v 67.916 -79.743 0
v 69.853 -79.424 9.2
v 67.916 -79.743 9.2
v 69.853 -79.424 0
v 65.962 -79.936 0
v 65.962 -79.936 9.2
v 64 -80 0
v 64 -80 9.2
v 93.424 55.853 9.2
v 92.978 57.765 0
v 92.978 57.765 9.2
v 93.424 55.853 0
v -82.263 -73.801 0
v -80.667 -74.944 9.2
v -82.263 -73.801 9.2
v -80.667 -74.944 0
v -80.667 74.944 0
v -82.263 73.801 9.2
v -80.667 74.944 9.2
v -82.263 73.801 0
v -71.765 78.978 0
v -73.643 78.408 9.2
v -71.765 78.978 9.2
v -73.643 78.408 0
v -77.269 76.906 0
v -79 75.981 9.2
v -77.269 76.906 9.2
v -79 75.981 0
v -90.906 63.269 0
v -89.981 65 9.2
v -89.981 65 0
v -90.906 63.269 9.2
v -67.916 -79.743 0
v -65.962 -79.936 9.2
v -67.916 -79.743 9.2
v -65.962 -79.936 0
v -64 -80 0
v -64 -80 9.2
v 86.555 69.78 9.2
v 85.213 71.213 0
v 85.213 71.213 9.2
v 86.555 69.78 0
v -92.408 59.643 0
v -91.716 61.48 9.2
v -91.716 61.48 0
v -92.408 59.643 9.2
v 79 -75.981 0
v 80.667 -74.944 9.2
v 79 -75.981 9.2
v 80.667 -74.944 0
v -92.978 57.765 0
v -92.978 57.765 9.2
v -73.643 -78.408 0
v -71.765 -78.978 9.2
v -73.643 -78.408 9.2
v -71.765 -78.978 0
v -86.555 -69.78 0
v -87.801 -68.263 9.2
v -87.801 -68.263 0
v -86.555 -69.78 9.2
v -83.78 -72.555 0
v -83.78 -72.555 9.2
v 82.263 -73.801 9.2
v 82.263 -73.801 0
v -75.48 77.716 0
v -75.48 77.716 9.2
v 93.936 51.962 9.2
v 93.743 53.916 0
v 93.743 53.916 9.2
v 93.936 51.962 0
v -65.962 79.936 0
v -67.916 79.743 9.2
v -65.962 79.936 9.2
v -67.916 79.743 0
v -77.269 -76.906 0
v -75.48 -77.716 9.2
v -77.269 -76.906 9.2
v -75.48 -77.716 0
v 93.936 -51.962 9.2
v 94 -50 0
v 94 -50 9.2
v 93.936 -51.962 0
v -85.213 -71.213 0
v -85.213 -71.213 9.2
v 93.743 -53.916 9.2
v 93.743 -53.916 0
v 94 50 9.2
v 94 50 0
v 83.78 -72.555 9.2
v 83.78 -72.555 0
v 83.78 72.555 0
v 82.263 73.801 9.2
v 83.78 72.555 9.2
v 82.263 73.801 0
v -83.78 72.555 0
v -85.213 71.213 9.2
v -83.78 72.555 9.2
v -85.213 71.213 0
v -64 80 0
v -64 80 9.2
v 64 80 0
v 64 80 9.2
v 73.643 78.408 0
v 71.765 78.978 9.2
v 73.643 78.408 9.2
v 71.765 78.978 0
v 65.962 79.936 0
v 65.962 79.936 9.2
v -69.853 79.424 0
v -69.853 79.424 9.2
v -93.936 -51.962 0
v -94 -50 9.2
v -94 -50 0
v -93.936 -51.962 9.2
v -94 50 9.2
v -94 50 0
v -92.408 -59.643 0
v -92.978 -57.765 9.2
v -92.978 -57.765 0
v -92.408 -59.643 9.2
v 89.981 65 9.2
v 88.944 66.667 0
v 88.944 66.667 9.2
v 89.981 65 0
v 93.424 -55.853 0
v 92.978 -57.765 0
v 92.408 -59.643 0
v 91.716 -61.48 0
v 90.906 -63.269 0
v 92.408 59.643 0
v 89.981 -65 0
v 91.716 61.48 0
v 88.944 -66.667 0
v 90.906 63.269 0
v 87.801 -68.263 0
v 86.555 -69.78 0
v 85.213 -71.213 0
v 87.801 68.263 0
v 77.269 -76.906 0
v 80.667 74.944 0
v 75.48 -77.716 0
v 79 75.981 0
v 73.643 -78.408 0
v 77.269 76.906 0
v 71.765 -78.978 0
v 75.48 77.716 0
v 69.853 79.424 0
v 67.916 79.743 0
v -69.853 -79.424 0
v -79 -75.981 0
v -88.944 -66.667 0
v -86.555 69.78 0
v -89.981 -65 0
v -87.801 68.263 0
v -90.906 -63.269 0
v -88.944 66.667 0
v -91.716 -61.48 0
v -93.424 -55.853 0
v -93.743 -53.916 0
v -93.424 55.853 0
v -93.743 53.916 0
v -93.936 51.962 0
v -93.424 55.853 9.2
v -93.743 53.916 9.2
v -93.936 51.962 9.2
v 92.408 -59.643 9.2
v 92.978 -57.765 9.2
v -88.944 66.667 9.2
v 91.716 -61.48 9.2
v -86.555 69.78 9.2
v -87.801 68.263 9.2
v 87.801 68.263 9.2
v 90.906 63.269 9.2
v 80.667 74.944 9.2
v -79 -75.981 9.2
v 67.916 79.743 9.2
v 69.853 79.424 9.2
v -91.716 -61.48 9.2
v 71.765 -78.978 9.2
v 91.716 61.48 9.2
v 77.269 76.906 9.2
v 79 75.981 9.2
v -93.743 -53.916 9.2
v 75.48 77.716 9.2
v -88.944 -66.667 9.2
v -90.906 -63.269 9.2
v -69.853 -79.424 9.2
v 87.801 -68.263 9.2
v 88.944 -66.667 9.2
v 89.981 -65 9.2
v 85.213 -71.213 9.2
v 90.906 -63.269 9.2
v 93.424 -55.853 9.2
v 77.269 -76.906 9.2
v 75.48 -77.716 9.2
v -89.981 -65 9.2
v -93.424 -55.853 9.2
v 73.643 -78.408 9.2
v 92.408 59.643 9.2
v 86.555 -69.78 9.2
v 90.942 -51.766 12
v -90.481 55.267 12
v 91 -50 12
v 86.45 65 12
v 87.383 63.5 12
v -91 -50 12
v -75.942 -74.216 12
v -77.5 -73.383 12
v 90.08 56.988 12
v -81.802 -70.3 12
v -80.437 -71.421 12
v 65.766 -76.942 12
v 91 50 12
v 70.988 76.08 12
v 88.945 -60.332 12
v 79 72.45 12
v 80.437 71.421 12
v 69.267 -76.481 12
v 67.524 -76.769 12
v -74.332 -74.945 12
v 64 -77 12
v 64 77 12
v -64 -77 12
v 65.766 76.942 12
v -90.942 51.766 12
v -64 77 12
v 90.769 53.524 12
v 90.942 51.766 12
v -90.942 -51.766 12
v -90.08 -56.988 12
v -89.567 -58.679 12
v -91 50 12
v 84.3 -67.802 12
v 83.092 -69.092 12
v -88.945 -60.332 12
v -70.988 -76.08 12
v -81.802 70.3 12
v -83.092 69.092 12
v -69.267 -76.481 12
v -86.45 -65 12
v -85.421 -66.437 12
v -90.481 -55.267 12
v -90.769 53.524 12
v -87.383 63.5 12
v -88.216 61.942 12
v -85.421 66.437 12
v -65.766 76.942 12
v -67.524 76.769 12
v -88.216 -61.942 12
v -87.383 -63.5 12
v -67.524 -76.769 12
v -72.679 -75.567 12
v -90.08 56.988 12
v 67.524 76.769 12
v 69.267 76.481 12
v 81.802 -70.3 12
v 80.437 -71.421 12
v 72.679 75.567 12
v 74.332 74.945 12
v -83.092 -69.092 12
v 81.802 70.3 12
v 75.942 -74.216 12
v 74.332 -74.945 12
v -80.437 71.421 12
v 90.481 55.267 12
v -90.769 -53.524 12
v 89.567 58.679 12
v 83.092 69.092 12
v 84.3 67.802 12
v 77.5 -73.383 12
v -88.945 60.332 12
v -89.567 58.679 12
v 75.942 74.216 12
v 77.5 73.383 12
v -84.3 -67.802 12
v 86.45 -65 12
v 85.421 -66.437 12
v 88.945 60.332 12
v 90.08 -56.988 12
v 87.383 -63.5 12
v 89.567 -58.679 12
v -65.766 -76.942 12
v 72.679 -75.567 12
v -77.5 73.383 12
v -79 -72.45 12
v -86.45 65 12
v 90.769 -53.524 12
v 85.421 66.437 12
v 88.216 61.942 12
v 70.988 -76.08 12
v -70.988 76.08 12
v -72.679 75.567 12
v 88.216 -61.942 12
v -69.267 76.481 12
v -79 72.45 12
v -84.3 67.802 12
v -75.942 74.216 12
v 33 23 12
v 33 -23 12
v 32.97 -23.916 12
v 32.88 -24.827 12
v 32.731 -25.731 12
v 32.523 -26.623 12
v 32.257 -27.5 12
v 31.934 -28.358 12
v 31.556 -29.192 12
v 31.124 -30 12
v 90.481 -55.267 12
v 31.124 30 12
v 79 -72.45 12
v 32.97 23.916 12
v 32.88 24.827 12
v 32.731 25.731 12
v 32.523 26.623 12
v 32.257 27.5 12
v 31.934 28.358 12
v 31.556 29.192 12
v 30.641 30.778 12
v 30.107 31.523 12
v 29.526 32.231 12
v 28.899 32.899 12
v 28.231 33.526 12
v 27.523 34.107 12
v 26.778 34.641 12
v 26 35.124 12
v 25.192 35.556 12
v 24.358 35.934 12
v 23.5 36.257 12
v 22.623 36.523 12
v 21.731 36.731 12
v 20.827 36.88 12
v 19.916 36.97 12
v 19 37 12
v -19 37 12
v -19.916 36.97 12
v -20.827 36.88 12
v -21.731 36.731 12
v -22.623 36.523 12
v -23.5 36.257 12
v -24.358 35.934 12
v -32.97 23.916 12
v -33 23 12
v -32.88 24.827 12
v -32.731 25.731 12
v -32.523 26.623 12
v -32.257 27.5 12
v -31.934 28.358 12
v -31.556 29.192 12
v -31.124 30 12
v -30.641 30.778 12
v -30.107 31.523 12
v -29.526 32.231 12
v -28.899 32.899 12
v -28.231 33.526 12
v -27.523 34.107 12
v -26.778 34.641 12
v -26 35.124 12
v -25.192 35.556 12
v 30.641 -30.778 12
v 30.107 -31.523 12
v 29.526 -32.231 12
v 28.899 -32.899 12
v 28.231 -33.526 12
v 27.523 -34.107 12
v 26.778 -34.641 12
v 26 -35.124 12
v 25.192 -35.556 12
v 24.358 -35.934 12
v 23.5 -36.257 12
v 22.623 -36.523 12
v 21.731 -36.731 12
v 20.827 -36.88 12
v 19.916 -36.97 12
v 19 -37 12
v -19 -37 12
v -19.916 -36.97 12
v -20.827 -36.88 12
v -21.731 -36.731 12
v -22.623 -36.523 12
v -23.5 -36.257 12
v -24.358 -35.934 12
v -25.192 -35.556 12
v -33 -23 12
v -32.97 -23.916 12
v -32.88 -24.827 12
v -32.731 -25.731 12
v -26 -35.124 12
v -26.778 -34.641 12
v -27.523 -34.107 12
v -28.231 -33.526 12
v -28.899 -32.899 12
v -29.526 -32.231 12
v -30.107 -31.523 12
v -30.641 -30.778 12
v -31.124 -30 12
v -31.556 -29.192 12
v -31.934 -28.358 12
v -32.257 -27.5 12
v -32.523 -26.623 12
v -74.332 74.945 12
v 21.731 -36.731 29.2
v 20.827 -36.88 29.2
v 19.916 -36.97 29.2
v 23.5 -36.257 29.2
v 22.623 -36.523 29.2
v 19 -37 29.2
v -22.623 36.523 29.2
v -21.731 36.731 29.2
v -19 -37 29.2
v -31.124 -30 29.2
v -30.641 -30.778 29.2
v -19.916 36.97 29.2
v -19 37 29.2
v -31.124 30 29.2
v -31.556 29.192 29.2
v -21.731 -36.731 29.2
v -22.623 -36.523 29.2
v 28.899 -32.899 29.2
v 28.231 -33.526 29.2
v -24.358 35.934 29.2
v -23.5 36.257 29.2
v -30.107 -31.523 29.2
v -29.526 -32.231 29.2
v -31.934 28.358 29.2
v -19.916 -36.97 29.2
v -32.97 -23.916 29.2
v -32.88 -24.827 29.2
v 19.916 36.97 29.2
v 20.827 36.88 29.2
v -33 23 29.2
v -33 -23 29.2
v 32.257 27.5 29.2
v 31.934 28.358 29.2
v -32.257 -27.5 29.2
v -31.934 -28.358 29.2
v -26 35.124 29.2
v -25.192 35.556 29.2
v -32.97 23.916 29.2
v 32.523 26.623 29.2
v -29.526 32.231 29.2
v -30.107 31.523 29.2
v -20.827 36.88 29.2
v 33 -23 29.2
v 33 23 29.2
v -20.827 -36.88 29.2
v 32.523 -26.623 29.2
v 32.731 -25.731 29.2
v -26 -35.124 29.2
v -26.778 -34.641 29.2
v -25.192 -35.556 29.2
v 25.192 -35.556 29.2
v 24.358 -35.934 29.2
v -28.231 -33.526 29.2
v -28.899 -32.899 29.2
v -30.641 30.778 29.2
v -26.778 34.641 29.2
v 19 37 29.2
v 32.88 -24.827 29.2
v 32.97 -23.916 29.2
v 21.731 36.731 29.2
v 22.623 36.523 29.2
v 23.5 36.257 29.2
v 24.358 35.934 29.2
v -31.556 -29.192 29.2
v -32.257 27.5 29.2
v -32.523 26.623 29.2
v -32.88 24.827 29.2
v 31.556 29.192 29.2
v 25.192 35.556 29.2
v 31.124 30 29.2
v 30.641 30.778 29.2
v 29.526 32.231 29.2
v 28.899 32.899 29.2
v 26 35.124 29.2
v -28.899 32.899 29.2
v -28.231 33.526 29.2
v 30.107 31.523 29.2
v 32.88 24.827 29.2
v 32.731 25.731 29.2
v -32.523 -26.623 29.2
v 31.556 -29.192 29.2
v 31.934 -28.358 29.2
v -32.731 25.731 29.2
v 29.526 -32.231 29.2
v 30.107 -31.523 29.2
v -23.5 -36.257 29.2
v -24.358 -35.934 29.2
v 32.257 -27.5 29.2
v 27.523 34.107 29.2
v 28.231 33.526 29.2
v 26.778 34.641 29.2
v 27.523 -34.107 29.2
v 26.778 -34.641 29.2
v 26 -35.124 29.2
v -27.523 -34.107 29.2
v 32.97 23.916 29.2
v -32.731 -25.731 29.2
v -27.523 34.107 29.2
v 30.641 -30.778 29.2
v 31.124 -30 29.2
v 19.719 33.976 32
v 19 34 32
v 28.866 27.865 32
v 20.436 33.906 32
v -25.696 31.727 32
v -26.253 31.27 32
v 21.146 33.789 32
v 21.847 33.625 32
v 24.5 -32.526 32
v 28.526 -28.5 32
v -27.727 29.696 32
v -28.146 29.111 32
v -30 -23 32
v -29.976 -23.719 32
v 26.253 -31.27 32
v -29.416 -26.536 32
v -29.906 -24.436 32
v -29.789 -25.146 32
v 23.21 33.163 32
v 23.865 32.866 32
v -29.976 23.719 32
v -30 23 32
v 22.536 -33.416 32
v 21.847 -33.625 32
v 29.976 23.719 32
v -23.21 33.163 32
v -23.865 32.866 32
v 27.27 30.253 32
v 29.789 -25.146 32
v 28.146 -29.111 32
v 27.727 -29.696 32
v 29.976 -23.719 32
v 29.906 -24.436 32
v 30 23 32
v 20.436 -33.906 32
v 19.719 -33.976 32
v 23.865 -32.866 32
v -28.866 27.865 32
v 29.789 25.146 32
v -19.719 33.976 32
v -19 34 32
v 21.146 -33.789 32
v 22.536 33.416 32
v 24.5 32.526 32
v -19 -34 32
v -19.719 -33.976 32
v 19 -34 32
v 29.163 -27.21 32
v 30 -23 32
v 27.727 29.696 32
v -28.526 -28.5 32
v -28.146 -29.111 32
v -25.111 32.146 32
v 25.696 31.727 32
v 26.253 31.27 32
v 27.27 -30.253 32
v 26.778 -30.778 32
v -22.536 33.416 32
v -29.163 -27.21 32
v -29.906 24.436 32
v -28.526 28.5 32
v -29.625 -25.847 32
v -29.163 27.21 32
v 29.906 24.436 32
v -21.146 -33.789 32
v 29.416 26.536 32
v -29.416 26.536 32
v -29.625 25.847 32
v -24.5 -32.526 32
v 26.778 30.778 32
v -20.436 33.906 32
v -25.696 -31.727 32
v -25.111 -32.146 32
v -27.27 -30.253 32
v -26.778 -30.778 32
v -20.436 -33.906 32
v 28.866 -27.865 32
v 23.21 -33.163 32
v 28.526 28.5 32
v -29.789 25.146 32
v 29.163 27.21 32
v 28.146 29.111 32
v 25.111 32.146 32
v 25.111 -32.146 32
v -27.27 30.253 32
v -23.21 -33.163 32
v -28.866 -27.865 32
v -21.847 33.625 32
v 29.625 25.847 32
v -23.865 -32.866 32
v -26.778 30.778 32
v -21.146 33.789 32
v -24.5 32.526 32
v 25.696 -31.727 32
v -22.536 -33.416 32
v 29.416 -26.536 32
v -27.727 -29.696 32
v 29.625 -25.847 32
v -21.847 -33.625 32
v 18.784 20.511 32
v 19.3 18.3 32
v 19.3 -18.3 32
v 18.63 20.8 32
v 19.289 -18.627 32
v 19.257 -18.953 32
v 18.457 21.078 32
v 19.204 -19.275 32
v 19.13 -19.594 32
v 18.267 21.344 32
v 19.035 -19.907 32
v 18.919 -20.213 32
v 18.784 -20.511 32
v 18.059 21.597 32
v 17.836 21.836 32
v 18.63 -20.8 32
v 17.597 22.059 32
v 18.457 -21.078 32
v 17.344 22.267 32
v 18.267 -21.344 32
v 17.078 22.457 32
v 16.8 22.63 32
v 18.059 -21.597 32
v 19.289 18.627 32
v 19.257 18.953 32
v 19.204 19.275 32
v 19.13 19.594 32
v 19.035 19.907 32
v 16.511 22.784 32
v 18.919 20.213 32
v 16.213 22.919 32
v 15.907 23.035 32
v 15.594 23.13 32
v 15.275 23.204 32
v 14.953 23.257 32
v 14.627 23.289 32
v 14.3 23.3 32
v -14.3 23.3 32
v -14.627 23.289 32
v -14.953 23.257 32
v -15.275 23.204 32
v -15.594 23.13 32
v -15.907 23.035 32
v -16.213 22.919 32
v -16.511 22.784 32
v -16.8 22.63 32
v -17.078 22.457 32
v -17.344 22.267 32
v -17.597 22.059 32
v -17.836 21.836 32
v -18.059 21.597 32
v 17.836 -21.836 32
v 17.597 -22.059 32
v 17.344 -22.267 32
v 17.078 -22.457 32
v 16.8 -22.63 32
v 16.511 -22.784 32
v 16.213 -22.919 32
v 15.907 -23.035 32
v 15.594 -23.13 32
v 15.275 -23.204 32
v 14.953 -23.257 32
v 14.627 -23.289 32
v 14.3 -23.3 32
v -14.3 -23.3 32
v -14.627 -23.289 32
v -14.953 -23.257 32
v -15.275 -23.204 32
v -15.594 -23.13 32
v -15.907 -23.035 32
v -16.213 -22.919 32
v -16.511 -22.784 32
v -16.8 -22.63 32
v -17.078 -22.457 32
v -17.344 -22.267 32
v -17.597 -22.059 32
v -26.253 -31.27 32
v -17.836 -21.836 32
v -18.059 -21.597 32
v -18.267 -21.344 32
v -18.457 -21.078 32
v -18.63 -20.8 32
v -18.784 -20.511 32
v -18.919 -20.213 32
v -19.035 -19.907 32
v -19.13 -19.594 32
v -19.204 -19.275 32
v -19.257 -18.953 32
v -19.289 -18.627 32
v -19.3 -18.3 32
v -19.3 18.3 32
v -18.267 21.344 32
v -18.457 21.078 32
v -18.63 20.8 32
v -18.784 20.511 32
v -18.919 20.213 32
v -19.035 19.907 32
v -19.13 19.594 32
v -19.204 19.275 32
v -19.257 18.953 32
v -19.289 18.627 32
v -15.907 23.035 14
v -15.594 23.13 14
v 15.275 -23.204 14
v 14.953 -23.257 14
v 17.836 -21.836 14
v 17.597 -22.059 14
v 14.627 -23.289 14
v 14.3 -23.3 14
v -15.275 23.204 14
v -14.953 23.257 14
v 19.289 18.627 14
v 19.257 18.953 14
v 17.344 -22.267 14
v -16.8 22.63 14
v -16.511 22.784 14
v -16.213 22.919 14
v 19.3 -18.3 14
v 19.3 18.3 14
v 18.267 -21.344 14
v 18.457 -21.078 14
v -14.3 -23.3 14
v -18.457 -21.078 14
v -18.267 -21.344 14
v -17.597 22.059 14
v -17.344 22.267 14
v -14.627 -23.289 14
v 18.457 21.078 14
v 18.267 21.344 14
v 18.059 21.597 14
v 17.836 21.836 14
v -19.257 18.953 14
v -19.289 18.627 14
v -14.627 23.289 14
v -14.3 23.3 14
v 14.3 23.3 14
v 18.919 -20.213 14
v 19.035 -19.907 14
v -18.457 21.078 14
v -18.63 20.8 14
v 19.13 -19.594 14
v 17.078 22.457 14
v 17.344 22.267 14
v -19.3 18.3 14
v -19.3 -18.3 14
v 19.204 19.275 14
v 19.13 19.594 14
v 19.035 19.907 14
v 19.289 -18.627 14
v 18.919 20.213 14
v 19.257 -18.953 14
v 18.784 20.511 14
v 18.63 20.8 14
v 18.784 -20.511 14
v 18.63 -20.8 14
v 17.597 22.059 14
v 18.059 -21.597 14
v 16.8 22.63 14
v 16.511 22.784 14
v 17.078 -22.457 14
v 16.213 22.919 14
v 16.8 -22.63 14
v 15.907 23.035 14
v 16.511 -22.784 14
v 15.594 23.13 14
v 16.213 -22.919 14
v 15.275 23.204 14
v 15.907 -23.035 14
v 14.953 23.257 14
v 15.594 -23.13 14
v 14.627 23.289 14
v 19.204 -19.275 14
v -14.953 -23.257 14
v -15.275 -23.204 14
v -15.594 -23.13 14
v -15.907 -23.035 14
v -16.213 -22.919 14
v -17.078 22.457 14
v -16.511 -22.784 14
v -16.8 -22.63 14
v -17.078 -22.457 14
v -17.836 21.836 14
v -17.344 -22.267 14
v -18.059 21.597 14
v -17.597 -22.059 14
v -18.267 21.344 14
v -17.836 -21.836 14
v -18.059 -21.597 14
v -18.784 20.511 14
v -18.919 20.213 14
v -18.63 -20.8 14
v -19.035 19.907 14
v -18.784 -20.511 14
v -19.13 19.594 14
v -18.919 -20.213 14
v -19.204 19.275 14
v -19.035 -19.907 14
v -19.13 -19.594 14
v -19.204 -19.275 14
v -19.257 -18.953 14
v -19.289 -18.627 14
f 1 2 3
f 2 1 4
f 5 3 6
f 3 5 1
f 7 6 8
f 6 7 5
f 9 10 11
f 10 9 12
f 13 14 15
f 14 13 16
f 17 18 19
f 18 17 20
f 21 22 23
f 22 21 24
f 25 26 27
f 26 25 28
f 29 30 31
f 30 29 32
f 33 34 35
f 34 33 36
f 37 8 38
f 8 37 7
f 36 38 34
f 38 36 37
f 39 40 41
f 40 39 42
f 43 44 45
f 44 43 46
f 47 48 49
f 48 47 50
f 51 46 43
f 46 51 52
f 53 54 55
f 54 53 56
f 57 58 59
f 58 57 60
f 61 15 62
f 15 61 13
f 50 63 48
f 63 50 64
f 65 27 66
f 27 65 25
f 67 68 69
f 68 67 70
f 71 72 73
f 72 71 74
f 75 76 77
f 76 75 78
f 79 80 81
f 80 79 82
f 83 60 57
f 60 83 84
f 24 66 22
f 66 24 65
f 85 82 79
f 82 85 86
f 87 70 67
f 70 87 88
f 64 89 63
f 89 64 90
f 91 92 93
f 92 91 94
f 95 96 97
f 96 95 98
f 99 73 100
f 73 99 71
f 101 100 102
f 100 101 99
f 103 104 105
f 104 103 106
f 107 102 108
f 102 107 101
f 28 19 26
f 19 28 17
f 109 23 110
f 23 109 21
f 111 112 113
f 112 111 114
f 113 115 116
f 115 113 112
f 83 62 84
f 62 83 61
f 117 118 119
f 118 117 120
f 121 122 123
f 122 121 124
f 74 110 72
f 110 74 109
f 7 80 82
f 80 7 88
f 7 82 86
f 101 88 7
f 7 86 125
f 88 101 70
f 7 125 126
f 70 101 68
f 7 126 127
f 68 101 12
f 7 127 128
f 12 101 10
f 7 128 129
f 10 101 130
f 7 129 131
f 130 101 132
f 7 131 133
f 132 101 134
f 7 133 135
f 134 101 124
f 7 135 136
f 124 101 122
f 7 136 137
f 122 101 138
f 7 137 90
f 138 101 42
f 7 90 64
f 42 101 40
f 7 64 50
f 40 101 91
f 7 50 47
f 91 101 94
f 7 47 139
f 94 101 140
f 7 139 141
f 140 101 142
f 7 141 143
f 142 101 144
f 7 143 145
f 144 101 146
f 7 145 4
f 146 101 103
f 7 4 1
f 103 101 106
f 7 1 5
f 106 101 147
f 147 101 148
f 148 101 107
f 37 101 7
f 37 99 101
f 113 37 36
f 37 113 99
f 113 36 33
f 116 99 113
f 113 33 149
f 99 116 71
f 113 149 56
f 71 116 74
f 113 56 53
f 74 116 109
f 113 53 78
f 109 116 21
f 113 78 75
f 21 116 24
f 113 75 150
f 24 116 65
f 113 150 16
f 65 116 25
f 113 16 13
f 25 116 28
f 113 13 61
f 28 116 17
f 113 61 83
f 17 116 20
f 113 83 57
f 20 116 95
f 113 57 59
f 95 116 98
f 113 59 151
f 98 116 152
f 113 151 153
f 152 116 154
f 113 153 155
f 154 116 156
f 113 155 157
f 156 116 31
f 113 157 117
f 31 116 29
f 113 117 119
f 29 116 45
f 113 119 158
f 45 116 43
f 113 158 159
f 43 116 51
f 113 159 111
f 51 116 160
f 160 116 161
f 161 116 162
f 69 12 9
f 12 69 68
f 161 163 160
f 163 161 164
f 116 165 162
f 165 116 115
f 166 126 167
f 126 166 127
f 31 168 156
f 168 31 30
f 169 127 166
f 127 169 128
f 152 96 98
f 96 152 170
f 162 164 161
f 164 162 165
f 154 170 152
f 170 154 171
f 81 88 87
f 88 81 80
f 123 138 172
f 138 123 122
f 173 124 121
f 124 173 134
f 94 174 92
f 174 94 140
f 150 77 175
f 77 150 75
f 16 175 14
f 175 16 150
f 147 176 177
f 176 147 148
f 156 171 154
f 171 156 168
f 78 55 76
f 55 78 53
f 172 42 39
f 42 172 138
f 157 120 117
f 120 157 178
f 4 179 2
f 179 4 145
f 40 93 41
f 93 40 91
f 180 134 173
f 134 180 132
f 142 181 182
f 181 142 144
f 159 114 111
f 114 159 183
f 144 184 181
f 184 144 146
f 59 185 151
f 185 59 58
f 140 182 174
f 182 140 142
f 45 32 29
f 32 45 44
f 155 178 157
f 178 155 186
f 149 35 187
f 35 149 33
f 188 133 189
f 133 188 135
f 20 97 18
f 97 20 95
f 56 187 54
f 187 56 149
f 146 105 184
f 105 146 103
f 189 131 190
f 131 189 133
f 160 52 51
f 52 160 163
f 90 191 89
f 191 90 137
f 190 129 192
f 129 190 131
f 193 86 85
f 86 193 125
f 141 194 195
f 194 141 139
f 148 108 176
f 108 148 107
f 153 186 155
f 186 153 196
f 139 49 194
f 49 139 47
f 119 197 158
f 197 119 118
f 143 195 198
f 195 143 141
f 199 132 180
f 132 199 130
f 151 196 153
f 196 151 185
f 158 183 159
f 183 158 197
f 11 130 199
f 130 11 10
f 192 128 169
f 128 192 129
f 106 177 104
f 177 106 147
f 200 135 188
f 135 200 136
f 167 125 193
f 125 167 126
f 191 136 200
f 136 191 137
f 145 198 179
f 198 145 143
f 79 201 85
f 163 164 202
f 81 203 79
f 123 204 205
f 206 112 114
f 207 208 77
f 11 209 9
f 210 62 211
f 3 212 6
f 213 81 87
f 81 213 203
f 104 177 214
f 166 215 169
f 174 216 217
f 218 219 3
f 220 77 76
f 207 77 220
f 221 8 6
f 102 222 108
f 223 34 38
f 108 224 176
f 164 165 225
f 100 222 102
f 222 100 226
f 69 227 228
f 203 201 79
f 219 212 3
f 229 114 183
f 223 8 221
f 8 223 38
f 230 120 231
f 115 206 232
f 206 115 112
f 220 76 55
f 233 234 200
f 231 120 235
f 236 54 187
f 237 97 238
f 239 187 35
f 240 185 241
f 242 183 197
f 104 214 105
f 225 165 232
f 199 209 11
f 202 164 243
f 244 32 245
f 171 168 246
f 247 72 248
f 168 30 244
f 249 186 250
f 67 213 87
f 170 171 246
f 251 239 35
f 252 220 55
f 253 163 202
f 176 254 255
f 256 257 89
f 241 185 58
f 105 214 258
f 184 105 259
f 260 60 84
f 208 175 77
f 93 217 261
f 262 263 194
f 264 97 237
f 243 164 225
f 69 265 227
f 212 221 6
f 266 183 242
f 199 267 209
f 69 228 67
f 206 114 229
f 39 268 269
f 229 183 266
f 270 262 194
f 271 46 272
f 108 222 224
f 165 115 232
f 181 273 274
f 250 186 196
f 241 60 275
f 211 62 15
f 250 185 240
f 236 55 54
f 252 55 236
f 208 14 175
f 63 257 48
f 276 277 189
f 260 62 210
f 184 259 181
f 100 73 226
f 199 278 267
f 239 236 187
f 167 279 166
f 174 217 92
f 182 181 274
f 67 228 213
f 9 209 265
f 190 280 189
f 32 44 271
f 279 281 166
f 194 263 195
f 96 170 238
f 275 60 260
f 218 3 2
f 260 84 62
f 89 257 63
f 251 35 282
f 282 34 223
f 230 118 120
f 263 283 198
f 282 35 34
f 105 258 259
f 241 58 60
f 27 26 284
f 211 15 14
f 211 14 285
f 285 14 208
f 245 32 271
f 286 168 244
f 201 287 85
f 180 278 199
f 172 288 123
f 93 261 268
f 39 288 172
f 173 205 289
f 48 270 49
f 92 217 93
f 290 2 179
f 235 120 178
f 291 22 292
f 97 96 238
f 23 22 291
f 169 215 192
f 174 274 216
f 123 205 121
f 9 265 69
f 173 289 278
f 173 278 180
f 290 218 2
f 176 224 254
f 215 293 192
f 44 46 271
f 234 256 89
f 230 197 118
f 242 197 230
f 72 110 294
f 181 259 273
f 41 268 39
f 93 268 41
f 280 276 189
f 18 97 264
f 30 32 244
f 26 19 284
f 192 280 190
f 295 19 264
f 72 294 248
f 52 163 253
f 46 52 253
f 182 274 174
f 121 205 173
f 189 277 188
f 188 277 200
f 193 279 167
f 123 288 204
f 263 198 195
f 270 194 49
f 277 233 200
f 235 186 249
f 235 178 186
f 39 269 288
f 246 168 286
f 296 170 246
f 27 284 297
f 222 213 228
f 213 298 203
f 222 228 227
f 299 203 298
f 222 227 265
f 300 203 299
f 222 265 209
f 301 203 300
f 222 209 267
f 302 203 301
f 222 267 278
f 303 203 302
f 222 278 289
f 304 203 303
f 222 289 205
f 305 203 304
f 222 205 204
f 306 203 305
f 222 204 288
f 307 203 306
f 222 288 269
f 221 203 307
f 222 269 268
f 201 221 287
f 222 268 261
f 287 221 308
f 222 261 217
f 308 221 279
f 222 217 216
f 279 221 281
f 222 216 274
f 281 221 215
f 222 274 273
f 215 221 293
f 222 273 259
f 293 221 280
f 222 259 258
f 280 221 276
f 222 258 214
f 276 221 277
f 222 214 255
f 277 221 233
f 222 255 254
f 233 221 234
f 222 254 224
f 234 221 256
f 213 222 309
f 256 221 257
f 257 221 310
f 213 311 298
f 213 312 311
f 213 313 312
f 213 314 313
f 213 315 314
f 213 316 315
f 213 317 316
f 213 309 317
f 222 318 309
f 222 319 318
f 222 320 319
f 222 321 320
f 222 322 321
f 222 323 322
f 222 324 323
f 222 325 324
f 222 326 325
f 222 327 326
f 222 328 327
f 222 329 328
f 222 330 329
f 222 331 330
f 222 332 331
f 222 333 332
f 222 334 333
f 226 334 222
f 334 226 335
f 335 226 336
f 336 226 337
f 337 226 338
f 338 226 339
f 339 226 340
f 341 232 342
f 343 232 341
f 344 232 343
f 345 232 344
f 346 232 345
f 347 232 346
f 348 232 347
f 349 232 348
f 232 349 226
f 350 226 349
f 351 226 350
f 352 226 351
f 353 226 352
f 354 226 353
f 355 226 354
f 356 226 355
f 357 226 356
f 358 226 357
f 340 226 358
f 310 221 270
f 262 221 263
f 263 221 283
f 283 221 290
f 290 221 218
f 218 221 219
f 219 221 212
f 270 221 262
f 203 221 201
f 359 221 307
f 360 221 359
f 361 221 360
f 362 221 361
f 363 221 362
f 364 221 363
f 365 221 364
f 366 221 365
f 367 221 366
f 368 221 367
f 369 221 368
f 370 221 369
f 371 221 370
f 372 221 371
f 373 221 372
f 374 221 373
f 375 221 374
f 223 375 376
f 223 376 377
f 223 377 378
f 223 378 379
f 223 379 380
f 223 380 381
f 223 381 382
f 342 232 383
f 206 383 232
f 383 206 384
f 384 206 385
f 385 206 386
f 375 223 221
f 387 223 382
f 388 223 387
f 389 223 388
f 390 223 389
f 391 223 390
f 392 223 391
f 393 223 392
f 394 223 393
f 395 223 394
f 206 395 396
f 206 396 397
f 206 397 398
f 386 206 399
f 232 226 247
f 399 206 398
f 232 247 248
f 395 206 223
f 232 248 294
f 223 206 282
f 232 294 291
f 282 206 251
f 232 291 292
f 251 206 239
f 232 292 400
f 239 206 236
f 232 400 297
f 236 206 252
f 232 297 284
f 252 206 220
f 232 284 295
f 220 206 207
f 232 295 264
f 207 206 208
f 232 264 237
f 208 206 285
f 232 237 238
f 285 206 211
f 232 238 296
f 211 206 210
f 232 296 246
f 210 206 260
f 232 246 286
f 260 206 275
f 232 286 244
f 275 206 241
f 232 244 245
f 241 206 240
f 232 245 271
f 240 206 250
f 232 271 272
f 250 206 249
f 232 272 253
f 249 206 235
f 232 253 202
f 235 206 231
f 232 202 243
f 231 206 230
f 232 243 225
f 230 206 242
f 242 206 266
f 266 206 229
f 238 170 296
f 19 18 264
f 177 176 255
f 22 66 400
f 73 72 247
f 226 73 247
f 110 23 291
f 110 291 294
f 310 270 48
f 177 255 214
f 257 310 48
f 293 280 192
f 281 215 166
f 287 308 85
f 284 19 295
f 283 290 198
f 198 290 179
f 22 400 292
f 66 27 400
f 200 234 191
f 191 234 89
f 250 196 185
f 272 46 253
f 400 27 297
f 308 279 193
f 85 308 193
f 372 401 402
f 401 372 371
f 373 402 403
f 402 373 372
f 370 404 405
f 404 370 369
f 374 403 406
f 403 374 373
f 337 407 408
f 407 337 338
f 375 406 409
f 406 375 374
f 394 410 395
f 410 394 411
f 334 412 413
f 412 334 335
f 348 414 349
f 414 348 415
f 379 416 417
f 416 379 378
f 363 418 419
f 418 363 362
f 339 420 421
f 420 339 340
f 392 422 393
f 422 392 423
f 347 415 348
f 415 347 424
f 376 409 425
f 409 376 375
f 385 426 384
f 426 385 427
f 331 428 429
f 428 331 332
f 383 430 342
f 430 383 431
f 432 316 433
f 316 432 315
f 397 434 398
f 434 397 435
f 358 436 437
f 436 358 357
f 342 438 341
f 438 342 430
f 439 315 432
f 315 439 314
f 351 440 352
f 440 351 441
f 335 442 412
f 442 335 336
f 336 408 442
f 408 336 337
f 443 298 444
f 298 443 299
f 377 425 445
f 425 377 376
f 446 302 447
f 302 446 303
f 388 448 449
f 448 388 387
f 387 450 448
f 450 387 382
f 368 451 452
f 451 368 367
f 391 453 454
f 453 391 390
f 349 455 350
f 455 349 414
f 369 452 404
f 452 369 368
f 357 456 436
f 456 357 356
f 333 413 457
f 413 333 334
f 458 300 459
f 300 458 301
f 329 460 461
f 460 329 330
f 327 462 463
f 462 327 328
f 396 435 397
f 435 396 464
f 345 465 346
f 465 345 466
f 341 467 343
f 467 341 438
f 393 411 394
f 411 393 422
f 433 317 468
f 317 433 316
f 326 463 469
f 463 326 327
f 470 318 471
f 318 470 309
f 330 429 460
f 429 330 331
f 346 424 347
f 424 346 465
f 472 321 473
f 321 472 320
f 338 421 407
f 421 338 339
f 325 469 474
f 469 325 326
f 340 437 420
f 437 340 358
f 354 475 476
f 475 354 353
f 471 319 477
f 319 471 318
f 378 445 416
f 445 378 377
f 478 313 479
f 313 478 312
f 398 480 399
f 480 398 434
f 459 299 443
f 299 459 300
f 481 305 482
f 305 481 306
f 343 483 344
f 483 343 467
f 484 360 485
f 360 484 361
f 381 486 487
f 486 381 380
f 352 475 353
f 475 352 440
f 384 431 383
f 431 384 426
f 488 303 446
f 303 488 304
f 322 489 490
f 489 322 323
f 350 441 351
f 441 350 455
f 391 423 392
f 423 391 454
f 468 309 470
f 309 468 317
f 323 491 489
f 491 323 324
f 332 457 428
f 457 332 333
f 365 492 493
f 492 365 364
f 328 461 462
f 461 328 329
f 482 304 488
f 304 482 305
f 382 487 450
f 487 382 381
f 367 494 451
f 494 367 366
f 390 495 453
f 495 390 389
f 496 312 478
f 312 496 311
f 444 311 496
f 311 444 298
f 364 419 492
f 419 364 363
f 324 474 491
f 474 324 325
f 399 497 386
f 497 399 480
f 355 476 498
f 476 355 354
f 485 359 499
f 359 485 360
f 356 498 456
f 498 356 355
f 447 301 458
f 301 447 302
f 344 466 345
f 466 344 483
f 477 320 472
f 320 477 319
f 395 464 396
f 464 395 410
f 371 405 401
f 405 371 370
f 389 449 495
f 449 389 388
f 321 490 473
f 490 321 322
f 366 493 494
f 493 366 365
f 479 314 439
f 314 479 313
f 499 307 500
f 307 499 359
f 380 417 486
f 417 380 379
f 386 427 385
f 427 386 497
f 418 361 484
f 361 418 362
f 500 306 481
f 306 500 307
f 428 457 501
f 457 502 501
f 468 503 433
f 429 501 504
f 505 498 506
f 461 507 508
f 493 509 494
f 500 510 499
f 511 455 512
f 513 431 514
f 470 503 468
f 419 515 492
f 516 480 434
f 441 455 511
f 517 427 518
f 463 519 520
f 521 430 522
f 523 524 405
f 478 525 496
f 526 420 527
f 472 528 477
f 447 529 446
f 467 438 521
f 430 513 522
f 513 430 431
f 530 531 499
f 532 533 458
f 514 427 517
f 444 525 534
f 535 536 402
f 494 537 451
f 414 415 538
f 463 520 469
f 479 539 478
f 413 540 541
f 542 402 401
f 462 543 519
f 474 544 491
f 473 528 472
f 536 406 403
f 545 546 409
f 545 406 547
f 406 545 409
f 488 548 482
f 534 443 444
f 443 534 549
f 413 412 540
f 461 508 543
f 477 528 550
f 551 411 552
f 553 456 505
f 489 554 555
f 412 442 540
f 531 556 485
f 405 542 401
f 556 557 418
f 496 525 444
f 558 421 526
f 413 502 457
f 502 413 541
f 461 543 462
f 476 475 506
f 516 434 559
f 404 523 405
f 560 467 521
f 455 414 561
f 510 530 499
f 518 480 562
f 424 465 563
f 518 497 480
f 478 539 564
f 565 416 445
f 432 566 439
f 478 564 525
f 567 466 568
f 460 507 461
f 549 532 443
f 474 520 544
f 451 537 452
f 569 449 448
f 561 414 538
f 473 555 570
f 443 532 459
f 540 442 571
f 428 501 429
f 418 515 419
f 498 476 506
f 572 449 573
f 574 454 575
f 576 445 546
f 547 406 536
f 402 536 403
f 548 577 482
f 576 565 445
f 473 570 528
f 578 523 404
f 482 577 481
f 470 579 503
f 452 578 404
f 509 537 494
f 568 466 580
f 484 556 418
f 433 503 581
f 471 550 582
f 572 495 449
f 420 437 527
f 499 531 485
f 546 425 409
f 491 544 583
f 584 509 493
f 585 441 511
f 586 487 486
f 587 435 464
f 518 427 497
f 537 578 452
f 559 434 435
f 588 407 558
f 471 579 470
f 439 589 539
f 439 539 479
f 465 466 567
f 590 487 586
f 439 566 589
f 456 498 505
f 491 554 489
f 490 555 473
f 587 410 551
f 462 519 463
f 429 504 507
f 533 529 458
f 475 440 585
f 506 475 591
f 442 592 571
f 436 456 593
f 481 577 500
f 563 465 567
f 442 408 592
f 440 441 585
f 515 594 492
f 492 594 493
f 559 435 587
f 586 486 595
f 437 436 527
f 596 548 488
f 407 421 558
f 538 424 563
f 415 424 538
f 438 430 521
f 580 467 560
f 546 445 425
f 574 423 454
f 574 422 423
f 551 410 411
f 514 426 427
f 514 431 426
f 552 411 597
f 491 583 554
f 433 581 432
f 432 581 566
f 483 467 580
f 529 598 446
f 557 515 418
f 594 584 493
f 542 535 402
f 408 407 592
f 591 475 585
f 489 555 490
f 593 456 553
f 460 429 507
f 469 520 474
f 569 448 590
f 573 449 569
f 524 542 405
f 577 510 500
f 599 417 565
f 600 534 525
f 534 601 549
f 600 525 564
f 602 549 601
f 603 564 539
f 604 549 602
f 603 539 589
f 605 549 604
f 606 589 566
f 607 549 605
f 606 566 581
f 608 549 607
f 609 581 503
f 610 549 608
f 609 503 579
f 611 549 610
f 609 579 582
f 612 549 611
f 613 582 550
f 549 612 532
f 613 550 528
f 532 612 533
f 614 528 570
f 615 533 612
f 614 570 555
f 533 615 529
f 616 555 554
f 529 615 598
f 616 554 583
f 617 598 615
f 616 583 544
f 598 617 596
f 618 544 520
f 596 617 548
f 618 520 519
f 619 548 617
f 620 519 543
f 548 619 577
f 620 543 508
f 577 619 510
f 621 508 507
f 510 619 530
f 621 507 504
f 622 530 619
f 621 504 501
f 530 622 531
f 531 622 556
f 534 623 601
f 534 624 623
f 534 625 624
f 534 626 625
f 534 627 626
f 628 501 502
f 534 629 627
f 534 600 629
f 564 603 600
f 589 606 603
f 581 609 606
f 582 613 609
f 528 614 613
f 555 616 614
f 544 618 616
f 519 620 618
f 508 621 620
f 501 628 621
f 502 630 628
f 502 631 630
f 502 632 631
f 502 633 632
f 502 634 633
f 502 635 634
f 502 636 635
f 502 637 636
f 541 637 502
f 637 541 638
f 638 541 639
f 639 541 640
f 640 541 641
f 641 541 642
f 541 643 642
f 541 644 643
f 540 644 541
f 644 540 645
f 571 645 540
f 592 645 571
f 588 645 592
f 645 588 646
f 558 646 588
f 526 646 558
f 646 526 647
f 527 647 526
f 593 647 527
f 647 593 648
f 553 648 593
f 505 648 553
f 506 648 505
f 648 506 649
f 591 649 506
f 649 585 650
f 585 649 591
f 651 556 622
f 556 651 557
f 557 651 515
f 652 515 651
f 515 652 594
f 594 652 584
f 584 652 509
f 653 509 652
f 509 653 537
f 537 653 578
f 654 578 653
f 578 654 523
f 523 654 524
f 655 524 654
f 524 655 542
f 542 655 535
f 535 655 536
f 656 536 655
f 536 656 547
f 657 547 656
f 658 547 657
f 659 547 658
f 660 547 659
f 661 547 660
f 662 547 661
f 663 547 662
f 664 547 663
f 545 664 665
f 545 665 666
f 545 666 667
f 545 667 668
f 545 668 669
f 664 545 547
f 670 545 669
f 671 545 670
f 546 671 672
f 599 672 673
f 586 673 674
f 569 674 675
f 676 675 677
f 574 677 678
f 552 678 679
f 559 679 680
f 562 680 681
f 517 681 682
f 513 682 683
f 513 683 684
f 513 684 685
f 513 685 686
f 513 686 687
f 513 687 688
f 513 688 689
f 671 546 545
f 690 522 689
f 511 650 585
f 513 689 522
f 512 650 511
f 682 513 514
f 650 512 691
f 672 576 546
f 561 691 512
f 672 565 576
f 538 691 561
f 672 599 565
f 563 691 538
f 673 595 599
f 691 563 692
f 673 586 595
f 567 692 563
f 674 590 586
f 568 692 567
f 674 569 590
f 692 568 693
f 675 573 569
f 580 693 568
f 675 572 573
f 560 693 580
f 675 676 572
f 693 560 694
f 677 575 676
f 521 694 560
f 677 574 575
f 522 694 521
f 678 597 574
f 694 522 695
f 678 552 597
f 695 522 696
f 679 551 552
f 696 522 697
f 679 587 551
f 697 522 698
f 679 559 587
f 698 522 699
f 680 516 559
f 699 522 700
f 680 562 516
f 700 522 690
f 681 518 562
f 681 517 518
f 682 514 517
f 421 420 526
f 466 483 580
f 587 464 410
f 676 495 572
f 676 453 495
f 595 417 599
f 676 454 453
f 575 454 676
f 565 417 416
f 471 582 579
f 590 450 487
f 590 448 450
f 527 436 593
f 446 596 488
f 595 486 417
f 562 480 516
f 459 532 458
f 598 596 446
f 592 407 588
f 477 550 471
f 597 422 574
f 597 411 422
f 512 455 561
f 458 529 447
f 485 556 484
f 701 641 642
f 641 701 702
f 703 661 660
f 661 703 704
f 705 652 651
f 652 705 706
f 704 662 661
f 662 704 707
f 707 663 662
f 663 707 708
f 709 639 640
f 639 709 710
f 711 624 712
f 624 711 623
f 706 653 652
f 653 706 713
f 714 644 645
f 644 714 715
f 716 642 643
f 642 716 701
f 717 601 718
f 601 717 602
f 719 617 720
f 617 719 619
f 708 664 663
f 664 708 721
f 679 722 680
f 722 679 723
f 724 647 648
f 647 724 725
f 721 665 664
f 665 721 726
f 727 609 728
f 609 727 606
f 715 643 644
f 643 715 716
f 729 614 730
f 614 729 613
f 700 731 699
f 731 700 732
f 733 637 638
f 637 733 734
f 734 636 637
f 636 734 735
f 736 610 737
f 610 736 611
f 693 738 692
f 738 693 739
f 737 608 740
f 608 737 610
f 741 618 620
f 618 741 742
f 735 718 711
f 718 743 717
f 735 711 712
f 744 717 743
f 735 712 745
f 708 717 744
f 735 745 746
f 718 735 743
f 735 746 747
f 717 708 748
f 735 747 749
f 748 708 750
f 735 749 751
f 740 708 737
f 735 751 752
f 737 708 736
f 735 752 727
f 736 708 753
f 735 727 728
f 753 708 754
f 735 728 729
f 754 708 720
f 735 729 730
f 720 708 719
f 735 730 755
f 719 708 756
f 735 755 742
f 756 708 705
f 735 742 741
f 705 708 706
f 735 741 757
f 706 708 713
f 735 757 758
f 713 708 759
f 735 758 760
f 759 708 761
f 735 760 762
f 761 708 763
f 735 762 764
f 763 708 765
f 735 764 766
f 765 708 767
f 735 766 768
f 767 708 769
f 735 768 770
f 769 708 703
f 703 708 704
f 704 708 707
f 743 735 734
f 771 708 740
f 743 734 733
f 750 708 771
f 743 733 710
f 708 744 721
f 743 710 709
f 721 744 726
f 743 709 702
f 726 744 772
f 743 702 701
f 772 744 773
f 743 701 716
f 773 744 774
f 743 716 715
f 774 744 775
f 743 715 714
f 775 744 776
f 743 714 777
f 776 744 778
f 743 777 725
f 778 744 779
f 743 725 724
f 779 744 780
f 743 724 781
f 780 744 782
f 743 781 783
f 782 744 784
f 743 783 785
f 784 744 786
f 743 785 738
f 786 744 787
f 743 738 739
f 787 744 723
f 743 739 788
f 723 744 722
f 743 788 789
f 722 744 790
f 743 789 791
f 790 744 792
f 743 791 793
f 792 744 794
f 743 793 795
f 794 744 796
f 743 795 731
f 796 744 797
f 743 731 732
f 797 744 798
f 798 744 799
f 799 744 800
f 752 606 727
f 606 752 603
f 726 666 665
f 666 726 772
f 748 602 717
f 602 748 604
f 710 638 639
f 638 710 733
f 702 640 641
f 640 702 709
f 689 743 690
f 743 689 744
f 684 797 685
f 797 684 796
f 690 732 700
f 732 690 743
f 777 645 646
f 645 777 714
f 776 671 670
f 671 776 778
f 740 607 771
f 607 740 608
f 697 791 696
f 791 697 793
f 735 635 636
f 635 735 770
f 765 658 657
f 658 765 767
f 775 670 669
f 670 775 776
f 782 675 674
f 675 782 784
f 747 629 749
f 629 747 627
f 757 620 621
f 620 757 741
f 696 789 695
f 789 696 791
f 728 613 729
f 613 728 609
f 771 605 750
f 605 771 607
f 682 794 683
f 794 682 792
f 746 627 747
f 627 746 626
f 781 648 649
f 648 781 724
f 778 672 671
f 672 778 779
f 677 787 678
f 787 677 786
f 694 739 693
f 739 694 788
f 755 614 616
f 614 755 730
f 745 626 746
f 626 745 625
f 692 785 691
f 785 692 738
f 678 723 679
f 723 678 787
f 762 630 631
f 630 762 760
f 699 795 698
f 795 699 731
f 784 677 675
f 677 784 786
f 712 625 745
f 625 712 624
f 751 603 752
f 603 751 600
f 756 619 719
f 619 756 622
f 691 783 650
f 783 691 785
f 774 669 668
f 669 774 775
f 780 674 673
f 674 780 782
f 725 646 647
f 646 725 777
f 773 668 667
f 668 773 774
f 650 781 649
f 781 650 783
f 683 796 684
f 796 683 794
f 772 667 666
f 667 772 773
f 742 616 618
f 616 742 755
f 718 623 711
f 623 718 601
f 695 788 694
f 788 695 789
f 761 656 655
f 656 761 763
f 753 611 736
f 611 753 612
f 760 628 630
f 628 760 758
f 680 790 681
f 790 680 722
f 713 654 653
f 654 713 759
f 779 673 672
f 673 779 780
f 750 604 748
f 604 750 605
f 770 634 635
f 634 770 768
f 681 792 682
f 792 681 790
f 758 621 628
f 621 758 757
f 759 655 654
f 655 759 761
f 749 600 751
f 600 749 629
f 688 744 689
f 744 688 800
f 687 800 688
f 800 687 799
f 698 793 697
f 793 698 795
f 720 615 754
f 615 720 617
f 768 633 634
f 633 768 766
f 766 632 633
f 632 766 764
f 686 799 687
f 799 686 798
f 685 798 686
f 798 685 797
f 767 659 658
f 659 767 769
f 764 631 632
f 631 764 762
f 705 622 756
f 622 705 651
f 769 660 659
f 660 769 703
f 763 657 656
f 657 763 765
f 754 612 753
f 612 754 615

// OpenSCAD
// Headphone stand in three printable parts: base, post, hanger.
// No glue, no screws. Rectangular (non-round) blade tenons prevent spinning.
// All dimensions in mm. Print orientation is the exported orientation (+Z up).
//
// Assembly heights (assembly coordinates, desk at z=0):
//   base plate/boss top        0 .. 32
//   post                       14.5 .. 250  (17.5 mm of it inside the base socket)
//   hanger tenon               228.5 .. 250 (21.5 mm inside the post socket)
//   hanger saddle top centre   270
// Socket clearances: 0.3 mm per side (socket is tenon + 0.6 in each dimension),
// tenon tips stop 0.5 mm above socket floors; shoulders/faces give the depth stop
// for the hanger, and the post bottoms in its socket.

part = "base"; // [base, post, hanger, assembly]
cadverify_only = "";

$fn = 96;

/* [Base] */
base_w = 188;          // desk footprint, X
base_d = 160;          // desk footprint, Y
base_plate_top = 9;    // straight plate wall up to here, then 45 deg chamfer to 12
base_top_plate = 12;
boss_w = 66;
boss_d = 74;
boss_straight_top = 29; // then 45 deg chamfer to boss_top
boss_top = 32;
base_socket_w = 38.6;  // post 38 + 0.6
base_socket_d = 46.6;  // post 46 + 0.6
base_socket_floor = 14;

/* [Post] */
post_w = 38;
post_d = 46;
post_len = 235.5;      // tip (local z=0) to top (assembly 250)
post_top_socket_w = 24.6; // hanger tenon 24 + 0.6
post_top_socket_d = 34.6; // hanger tenon 34 + 0.6
post_top_socket_floor_local = 213.5; // assembly 228

/* [Hanger, modelled in print coordinates] */
// Print coordinates: X = saddle length, Y = height above tenon tip,
// Z = saddle width direction (part lies on its Z=0 side face on the bed).
hang_len_half = 69;    // overall saddle half length incl. rounded end point
hang_width = 34;       // >= 30 mm headband support width
hang_top_rel = 41.5;   // tenon tip to saddle crown; assembly 228.5 + 41.5 = 270
hang_arc_r = 170;      // crown radius of the headband contact surface
hang_plate_t = 10;     // saddle plate thickness (vertical, in profile)
hang_tenon_half_w = 12;  // tenon is 24 (X) x 34 (width)
hang_shoulder_rel = 21.5; // assembly 250, post top
hang_neck_half_w = 17;

function hang_top_z(x) = hang_top_rel - (hang_arc_r - sqrt(hang_arc_r*hang_arc_r - x*x));
function hang_bot_z(x) = hang_top_z(x) - hang_plate_t;

module rounded_rect(w, d, r) {
    offset(r = r) square([w - 2*r, d - 2*r], center = true);
}

module instance(name, part_name, unit = 1) {
    echo(cadverify_instance = [name, part_name, unit]);
    if (cadverify_only == "" || cadverify_only == name) children();
}

/* ---------- BASE (print = assembly orientation) ---------- */
module base_part() {
    difference() {
        // Outer corners of the plate and boss are rounded in plan view (corner
        // radius >= 6 mm) and the top rims have 45 deg x 3 mm chamfers, so
        // nothing sticks out beyond the bounding box or the support plane.
        union() {
            // desk plate with 45 deg top edge chamfer
            linear_extrude(base_plate_top) rounded_rect(base_w, base_d, 30);
            hull() {
                translate([0, 0, base_plate_top]) linear_extrude(0.2)
                    rounded_rect(base_w, base_d, 30);
                translate([0, 0, base_top_plate - 0.2]) linear_extrude(0.2)
                    rounded_rect(base_w - 6, base_d - 6, 27);
            }
            // raised boss / collar around the post socket, 45 deg top chamfer
            translate([0, 0, base_top_plate])
                linear_extrude(boss_straight_top - base_top_plate)
                    rounded_rect(boss_w, boss_d, 14);
            hull() {
                translate([0, 0, boss_straight_top]) linear_extrude(0.2)
                    rounded_rect(boss_w, boss_d, 14);
                translate([0, 0, boss_top - 0.2]) linear_extrude(0.2)
                    rounded_rect(boss_w - 6, boss_d - 6, 11);
            }
        }
        // blind rectangular socket for the post (stops post spinning)
        translate([0, 0, base_socket_floor])
            linear_extrude(boss_top - base_socket_floor + 2)
                rounded_rect(base_socket_w, base_socket_d, 5);
    }
}

/* ---------- POST (printed upright, local z=0 is tenon tip) ---------- */
module post_part() {
    difference() {
        // Solid rectangular column, corners rounded 8 mm in plan view.
        linear_extrude(post_len) rounded_rect(post_w, post_d, 8);
        // Blind rectangular socket in the top for the hanger blade tenon:
        // tenon + 0.6 mm per side (0.3 mm clearance); the non-round rectangle
        // is what stops the hanger spinning on the post.
        translate([0, 0, post_top_socket_floor_local])
            linear_extrude(post_len - post_top_socket_floor_local + 2)
                rounded_rect(post_top_socket_w, post_top_socket_d, 5);
    }
}

/* ---------- HANGER (printed on its side) ---------- */
module hanger_part() {
    top_pts    = [for (x = [56 : -8 : -56]) [x, hang_top_z(x)]];
    bot_r_pts  = [for (x = [40 : 8 : 64]) [40 + 8*floor((x - 24)/8), 0]];
    bot_l_pts  = [for (x = [-64 : 8 : -40]) [0, 0]];
    mid64 = (hang_top_z(64) + hang_bot_z(64)) / 2;
    // Saddle/neck profile above the shoulder plane (print y = hang_shoulder_rel).
    profile = concat(
        [[-hang_neck_half_w, hang_shoulder_rel], [hang_neck_half_w, hang_shoulder_rel],
         [30, hang_bot_z(30)]],
        bot_r_pts,
        [[hang_len_half - 0.5, mid64], [64, hang_top_z(64)]],
        top_pts,
        [[-64, hang_top_z(64)], [-(hang_len_half - 0.5), mid64], [-64, hang_bot_z(64)]],
        bot_l_pts,
        [[-30, hang_bot_z(30)]]
    );
    difference() {
        union() {
            linear_extrude(hang_width) polygon(profile);
            // Blade tenon below the shoulder: 24 x 34 with 4 mm corner radii,
            // so it clears the post socket's 5 mm rounded corners. It reaches
            // 2 mm up into the neck so the union is volumetric, not face-only.
            translate([0, 0, hang_width/2]) rotate([-90, 0, 0])
                linear_extrude(hang_shoulder_rel + 2)
                    rounded_rect(2*hang_tenon_half_w, hang_width, 4);
        }
        // 45 deg chamfers on the two crown side edges, limited to the central
        // contact zone |x| <= 36. Each box is the half-space beyond its
        // chamfer plane, rotated -45 deg about X from an origin on the plane:
        //   far side keeps Y + Z <= hang_top_z(36) + hang_width
        //   bed side keeps Y - Z <= hang_top_z(36)
        // At |x| = 36 the crown meets the plane, so beyond it the plate keeps
        // its full 34 mm width; at the centre the chamfers leave a ~30.7 mm
        // flat crown. The bed-side chamfer face itself is exactly 45 deg.
        translate([0, hang_top_z(36), hang_width]) rotate([-45, 0, 0])
            translate([-36, 0, 0]) cube([72, 40, 40]);
        translate([0, hang_top_z(36), 0]) rotate([-45, 0, 0])
            translate([-36, 0, 0]) cube([72, 40, 40]);
    }
}

/* ---------- Spec echoes ---------- */
if (part == "base") {
    echo(cadverify_spec = [
        ["bounds", [[-base_w/2, -base_d/2, 0], [base_w/2, base_d/2, boss_top]]],
        ["bodies", 1],
        ["through_holes", 0],
        ["support_faces", [["desk", "-z", 25000]]],
        ["overhangs_allowed", []],
        ["copies", 1],
        ["details", [
            ["plate", "material", [[-80, -60, 2], [80, 60, 10]], 0.99],
            ["boss_wall", "material", [[22, -30, 16], [31, 30, 28]], 0.99],
            ["post_socket", "void", [[-17, -21, 16], [17, 21, 30]], 0.99],
            ["socket_floor", "thickness", [0, 0, 42], [0, 0, -1], base_socket_floor],
            ["boss_socket_top", "view", [[-34, -38, 27], [34, 38, boss_top]]]
        ]]
    ]);
} else if (part == "post") {
    echo(cadverify_spec = [
        ["bounds", [[-post_w/2, -post_d/2, 0], [post_w/2, post_d/2, post_len]]],
        ["bodies", 1],
        ["through_holes", 0],
        ["support_faces", [["bed", "-z", 1500]]],
        ["overhangs_allowed", []],
        ["copies", 1],
        ["details", [
            ["column", "material", [[-16, -20, 30], [16, 20, 200]], 0.99],
            ["hanger_socket", "void", [[-10, -15, 216], [10, 15, 234]], 0.99],
            ["column_width", "thickness", [32, 0, 100], [-1, 0, 0], post_w],
            ["top_socket", "view", [[-19, -23, 210], [19, 23, post_len]]]
        ]]
    ]);
} else if (part == "hanger") {
    // actual extreme points are the saddle end tips at +-(hang_len_half - 0.5)
    echo(cadverify_spec = [
        ["bounds", [[-(hang_len_half - 0.5), 0, 0], [hang_len_half - 0.5, hang_top_rel, hang_width]]],
        ["bodies", 1],
        ["through_holes", 0],
        ["support_faces", [["bed", "-z", 1200]]],
        ["overhangs_allowed", [
            ["45deg crown chamfer on bed side", [[-36, 37, 0], [36, hang_top_rel, 5]]]
        ]],
        ["copies", 1],
        ["details", [
            ["saddle_plate", "material", [[-25, 32, 5], [25, 38, 29]], 0.99],
            ["tenon", "material", [[-10, 2, 5], [10, 20, 29]], 0.99],
            ["saddle_thickness", "thickness", [50, 52, 17], [0, -1, 0], hang_plate_t],
            ["rounded_crown", "view", [[-40, 27, 0], [40, hang_top_rel, hang_width]]]
        ]]
    ]);
} else if (part == "assembly") {
    echo(cadverify_spec = [
        ["bounds", [[-base_w/2, -base_d/2, 0], [base_w/2, base_d/2, 270]]],
        ["support_faces", [["desk", "-z", 25000]]],
        ["allowed_interferences", []],
        ["assembly_order", [
            [["base"], [0, 0, 0]],
            [["post"], [0, 0, -1]],
            [["hanger"], [0, 0, -1]]
        ]]
    ]);
}

/* ---------- Output ---------- */
if (part == "base") {
    base_part();
} else if (part == "post") {
    post_part();
} else if (part == "hanger") {
    hanger_part();
} else if (part == "assembly") {
    instance("base", "base") base_part();
    instance("post", "post") translate([0, 0, 14.5]) post_part();
    // hanger print coords (x, y=height rel. tenon tip, z=width)
    //   -> assembly (x, 17-z, 228.5+y): tenon tip at 228.5, crown at 270
    instance("hanger", "hanger")
        translate([0, hang_width/2, 228.5]) rotate([90, 0, 0]) hanger_part();
} else {
    assert(false, str("unknown part: ", part));
}
